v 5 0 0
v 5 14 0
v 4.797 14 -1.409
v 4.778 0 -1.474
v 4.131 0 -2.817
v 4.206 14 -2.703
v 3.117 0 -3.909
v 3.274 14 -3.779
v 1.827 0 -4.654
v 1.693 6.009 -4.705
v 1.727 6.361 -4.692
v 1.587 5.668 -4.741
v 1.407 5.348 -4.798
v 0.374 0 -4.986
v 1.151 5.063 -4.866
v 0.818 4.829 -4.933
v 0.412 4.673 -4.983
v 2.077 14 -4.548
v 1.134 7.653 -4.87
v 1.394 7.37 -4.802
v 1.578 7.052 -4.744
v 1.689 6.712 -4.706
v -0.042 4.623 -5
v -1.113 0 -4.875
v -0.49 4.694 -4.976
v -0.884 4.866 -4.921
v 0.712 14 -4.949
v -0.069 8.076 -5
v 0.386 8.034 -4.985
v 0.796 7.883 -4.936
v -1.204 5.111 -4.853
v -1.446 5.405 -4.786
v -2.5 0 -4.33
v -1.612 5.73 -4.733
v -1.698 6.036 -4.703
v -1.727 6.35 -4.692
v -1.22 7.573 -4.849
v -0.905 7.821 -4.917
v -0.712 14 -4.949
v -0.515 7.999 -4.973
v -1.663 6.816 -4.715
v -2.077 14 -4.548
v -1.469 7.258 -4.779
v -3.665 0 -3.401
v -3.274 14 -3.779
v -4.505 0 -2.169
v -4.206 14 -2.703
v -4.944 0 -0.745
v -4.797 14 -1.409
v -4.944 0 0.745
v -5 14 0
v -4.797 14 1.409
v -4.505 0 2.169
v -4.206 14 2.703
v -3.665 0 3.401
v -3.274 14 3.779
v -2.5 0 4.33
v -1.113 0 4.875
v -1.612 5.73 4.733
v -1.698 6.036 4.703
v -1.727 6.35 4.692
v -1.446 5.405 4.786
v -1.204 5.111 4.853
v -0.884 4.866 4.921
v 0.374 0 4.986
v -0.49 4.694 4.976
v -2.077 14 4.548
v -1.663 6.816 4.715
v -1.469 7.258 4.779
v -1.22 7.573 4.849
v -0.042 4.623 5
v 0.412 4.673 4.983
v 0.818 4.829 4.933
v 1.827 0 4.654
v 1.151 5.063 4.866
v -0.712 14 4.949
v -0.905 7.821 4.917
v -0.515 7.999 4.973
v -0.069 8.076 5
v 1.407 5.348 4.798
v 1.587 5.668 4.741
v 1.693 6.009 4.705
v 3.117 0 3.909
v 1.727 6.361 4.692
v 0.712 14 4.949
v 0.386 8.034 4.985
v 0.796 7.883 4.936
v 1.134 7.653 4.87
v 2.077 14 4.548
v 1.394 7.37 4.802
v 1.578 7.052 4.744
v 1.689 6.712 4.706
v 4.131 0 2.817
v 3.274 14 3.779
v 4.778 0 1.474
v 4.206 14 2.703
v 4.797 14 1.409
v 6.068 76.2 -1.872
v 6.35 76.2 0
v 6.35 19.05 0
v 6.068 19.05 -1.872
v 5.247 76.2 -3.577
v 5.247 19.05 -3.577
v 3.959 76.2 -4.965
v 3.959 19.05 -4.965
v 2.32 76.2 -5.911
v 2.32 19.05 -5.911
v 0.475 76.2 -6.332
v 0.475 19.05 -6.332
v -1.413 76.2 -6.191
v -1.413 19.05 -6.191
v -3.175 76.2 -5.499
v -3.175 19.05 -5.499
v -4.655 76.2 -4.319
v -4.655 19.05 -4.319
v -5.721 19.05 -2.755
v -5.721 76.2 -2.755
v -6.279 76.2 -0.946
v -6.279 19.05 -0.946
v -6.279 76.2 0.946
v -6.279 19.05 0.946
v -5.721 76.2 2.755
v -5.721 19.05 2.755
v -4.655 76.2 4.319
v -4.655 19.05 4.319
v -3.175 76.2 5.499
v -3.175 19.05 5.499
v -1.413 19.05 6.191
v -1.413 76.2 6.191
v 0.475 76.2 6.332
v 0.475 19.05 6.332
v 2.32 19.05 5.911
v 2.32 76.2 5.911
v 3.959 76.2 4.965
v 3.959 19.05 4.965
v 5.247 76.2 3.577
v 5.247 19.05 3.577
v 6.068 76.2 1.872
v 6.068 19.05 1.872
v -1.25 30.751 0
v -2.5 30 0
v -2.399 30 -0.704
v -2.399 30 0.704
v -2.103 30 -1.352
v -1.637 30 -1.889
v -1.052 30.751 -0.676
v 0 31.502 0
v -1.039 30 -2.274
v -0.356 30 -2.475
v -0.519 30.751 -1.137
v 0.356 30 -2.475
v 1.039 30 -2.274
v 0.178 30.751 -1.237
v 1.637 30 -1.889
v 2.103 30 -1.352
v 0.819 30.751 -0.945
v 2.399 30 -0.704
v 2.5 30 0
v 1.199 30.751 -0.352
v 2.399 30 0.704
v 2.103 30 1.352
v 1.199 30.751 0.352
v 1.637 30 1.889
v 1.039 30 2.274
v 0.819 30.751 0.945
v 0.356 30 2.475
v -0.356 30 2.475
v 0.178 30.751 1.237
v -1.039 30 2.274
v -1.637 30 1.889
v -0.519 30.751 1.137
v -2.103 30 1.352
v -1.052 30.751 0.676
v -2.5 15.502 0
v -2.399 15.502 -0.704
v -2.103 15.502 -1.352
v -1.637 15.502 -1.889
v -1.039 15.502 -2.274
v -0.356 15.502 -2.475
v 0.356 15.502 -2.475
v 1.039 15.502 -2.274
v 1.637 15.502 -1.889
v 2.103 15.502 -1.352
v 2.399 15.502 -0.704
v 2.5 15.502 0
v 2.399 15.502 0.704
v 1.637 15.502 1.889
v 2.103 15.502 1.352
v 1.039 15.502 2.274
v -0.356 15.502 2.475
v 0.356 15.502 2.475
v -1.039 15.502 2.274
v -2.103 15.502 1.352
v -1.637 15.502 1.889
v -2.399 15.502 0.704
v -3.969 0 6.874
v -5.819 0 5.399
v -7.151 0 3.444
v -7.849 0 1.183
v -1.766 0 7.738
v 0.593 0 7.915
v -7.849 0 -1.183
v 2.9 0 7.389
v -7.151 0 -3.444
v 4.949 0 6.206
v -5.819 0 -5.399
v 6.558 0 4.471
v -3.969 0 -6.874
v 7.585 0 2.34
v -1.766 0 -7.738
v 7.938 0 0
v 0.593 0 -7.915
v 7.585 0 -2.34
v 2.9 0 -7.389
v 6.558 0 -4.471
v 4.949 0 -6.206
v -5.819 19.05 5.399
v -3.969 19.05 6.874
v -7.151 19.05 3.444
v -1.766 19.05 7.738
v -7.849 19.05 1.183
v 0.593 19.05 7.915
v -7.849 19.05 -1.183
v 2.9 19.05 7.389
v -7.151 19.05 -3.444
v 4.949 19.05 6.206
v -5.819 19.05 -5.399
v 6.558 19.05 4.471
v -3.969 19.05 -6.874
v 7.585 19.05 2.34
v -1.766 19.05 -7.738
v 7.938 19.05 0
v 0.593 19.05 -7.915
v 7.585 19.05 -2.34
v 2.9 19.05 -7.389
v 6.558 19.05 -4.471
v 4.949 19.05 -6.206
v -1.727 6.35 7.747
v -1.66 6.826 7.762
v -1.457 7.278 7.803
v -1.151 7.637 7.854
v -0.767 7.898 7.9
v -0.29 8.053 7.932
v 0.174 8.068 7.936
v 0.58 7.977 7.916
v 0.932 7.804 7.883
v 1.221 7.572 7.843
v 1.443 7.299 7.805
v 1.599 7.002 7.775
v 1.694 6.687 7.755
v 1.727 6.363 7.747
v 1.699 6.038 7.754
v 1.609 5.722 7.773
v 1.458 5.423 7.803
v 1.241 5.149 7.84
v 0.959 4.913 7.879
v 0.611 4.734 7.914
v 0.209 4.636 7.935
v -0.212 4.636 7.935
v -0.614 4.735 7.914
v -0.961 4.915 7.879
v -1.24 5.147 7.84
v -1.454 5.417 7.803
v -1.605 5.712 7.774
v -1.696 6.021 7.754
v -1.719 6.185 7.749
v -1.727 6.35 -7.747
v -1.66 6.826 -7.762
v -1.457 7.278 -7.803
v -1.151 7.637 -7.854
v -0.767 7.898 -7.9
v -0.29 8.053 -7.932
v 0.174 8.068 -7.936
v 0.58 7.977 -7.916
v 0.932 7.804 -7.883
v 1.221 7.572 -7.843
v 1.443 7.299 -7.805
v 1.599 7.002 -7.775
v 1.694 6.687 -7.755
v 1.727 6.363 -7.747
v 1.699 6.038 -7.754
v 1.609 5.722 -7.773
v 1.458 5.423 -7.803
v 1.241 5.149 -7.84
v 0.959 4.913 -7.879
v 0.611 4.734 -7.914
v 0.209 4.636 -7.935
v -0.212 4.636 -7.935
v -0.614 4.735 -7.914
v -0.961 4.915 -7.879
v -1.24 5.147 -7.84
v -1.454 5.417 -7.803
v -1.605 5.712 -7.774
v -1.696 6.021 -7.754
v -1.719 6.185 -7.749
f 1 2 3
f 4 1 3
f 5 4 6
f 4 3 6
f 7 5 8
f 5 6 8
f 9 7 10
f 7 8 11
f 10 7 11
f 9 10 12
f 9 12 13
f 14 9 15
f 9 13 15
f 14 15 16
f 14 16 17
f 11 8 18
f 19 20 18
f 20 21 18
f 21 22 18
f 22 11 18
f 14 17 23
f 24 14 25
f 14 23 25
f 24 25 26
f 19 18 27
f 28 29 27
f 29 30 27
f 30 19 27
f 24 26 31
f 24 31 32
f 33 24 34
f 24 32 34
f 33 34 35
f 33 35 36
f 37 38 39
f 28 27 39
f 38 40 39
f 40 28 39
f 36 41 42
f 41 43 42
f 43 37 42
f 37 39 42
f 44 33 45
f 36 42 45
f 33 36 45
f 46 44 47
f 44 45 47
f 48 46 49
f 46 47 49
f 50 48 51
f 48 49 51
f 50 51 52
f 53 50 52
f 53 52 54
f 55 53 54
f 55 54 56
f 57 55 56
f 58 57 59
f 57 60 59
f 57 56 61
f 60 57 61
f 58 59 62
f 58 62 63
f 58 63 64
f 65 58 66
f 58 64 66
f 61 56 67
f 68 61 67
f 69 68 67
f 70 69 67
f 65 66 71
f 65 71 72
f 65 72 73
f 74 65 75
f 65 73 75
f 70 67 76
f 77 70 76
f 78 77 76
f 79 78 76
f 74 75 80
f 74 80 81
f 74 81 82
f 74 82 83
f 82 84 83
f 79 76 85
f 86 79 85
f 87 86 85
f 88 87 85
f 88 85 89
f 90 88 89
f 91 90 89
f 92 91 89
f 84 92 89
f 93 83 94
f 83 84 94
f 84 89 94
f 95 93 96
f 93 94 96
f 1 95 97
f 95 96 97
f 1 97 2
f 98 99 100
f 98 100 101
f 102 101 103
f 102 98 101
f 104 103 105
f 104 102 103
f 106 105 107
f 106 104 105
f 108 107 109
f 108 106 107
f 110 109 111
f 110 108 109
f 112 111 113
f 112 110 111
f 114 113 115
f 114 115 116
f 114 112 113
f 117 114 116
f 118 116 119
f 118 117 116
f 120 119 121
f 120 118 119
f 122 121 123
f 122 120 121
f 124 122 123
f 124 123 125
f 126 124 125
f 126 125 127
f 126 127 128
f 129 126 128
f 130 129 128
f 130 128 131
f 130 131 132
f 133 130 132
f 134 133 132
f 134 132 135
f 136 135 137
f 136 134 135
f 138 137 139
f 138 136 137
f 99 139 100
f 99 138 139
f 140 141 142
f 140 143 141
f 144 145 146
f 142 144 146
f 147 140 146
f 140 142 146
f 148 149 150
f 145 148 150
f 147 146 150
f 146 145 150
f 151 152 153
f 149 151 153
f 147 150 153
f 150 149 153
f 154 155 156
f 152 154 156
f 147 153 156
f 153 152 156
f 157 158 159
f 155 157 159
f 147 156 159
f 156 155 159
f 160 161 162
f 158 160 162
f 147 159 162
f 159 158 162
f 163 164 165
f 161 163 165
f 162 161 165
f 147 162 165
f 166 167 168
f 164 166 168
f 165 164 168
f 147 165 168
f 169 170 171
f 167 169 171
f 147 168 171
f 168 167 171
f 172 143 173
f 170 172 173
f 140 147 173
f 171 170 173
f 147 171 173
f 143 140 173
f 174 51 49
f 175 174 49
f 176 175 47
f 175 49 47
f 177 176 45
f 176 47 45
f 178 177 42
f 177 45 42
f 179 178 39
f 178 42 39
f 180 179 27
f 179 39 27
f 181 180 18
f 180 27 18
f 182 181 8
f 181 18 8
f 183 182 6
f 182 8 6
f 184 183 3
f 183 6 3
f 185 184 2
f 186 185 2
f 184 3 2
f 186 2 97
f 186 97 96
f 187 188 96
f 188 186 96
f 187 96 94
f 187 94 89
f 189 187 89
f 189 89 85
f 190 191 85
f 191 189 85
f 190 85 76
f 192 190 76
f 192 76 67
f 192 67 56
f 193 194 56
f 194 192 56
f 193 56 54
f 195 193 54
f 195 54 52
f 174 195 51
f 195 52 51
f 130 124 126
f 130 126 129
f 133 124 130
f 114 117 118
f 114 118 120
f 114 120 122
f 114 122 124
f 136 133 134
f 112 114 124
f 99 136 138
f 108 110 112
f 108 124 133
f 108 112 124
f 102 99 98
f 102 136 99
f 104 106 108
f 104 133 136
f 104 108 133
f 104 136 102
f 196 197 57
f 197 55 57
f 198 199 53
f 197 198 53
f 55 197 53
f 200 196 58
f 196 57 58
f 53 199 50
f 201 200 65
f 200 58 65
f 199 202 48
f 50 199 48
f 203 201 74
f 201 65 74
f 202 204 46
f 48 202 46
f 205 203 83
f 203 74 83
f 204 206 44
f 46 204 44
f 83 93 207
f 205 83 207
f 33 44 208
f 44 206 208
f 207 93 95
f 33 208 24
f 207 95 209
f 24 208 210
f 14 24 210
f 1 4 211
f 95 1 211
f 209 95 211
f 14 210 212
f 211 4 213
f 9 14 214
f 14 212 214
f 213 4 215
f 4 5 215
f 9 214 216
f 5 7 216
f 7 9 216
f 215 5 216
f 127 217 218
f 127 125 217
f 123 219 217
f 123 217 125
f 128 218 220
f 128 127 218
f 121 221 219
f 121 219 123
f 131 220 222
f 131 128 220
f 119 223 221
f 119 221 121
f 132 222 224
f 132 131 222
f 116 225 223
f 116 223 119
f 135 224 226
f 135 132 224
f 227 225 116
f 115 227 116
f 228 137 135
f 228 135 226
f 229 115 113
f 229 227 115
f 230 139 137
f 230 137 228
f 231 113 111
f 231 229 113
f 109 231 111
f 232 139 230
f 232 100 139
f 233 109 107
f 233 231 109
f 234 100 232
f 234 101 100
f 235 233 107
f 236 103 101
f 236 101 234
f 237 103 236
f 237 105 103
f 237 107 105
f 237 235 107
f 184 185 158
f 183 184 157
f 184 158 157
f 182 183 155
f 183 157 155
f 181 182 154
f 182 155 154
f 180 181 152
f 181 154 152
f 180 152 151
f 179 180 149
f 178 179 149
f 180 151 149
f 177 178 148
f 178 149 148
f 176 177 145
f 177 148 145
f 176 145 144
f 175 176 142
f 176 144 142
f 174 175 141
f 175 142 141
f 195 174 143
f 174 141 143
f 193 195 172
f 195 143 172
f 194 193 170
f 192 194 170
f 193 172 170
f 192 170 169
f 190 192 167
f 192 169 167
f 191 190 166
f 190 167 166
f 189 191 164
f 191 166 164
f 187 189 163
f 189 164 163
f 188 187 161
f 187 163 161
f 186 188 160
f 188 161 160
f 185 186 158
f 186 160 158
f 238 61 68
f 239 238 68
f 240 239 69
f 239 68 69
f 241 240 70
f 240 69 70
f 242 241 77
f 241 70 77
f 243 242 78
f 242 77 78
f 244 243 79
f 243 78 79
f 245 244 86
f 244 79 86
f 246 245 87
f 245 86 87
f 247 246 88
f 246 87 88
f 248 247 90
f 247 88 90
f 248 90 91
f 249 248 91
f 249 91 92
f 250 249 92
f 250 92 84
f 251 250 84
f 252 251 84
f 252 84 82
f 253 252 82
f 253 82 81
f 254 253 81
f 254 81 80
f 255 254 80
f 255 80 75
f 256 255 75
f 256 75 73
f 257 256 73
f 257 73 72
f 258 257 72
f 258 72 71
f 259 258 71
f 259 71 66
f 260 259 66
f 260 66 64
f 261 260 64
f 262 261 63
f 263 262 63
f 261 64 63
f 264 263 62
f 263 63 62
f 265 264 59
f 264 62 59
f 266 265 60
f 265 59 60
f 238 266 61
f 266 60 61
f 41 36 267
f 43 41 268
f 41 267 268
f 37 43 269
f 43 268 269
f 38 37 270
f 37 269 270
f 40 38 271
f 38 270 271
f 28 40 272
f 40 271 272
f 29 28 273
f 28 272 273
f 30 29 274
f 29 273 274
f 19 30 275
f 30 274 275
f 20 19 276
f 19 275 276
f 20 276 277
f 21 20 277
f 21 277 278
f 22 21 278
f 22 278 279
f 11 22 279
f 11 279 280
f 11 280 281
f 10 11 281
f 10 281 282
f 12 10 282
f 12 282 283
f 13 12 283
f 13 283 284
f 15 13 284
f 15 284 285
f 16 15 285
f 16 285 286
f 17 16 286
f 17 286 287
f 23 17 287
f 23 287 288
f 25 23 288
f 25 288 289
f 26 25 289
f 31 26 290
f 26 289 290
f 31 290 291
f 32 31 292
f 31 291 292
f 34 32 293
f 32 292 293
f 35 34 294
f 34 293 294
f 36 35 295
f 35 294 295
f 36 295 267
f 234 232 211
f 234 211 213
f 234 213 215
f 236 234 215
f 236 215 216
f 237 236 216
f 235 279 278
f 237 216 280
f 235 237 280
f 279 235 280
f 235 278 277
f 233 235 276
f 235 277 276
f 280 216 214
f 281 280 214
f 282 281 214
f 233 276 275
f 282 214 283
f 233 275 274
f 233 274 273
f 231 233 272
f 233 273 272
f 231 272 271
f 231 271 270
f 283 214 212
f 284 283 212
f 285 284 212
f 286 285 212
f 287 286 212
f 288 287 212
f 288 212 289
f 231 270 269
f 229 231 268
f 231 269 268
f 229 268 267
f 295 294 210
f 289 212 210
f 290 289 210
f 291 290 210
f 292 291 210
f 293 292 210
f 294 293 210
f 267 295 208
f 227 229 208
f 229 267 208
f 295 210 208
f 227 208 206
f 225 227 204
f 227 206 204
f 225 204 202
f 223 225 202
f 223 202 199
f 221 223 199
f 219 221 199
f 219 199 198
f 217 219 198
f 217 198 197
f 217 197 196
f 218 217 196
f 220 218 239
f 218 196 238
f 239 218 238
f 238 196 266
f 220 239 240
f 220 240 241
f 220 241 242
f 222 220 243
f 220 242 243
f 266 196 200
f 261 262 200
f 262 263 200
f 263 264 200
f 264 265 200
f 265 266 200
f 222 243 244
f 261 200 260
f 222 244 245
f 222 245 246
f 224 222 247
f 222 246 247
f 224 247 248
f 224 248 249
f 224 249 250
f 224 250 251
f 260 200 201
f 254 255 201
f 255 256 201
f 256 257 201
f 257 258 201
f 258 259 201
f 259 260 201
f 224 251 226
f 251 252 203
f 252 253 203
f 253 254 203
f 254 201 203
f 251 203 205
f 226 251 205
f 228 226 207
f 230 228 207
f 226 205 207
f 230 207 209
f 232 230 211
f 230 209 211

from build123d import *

# Parameters (mm, degrees)
SKETCH1_R                      = 7.9375
BOSS_EXTRUDE1_DEPTH            = 76.2
M6X1_0_TAPPED_HOLE1_D          = 5
M6X1_0_TAPPED_HOLE1_DEPTH      = 29.9999908
M6X1_0_TAPPED_HOLE1_TIP        = 1.502151548
F_10_0_10_DIAMETER_HOLE2_D     = 10
F_10_0_10_DIAMETER_HOLE2_DEPTH = 13.9999974
F_10_0_10_DIAMETER_HOLE2_TIP   = 3.004303095
F_8_32_TAPPED_HOLE1_D          = 3.4544
SKETCH15_R                     = 7.9375
SKETCH15_R_2                   = 6.35
CUT_EXTRUDE2_DEPTH             = 57.15


with BuildPart() as part:
    # Sketch1 → Boss-Extrude1 (new body)
    with BuildSketch(Plane(origin=(0, 0, 0), x_dir=(1, 0, 0), z_dir=(0, 1, 0))):
        Circle(SKETCH1_R)
    extrude(amount=BOSS_EXTRUDE1_DEPTH)

    # M6x1.0 Tapped Hole1
    with Locations(Plane(origin=(0, 0, 0), x_dir=(-1, 0, 0), z_dir=(0, -1, 0))):
        with Locations((0, 0)):
            Hole(M6X1_0_TAPPED_HOLE1_D / 2, depth=M6X1_0_TAPPED_HOLE1_DEPTH)
            with Locations((0, 0, -(M6X1_0_TAPPED_HOLE1_DEPTH + M6X1_0_TAPPED_HOLE1_TIP / 2))):  # 118° drill point
                Cone(0, M6X1_0_TAPPED_HOLE1_D / 2, M6X1_0_TAPPED_HOLE1_TIP, mode=Mode.SUBTRACT)

    # Ø10.0 (10) Diameter Hole2
    with Locations(Plane(origin=(0, 0, 0), x_dir=(-1, 0, 0), z_dir=(0, -1, 0))):
        with Locations((0, 0)):
            Hole(F_10_0_10_DIAMETER_HOLE2_D / 2, depth=F_10_0_10_DIAMETER_HOLE2_DEPTH)
            with Locations((0, 0, -(F_10_0_10_DIAMETER_HOLE2_DEPTH + F_10_0_10_DIAMETER_HOLE2_TIP / 2))):  # 118° drill point
                Cone(0, F_10_0_10_DIAMETER_HOLE2_D / 2, F_10_0_10_DIAMETER_HOLE2_TIP, mode=Mode.SUBTRACT)

    # #8-32 Tapped Hole1 (through all)
    with Locations(Plane.XY.offset(7.9375)):
        with Locations((0, 6.35)):
            Hole(F_8_32_TAPPED_HOLE1_D / 2)

    # Sketch15 → Cut-Extrude2 (cut)
    with BuildSketch(Plane(origin=(0, 76.2, 0), x_dir=(1, 0, 0), z_dir=(0, 1, 0))):
        Circle(SKETCH15_R)
        Circle(SKETCH15_R_2, mode=Mode.SUBTRACT)
    extrude(amount=-CUT_EXTRUDE2_DEPTH, mode=Mode.SUBTRACT)


solid = part.part
